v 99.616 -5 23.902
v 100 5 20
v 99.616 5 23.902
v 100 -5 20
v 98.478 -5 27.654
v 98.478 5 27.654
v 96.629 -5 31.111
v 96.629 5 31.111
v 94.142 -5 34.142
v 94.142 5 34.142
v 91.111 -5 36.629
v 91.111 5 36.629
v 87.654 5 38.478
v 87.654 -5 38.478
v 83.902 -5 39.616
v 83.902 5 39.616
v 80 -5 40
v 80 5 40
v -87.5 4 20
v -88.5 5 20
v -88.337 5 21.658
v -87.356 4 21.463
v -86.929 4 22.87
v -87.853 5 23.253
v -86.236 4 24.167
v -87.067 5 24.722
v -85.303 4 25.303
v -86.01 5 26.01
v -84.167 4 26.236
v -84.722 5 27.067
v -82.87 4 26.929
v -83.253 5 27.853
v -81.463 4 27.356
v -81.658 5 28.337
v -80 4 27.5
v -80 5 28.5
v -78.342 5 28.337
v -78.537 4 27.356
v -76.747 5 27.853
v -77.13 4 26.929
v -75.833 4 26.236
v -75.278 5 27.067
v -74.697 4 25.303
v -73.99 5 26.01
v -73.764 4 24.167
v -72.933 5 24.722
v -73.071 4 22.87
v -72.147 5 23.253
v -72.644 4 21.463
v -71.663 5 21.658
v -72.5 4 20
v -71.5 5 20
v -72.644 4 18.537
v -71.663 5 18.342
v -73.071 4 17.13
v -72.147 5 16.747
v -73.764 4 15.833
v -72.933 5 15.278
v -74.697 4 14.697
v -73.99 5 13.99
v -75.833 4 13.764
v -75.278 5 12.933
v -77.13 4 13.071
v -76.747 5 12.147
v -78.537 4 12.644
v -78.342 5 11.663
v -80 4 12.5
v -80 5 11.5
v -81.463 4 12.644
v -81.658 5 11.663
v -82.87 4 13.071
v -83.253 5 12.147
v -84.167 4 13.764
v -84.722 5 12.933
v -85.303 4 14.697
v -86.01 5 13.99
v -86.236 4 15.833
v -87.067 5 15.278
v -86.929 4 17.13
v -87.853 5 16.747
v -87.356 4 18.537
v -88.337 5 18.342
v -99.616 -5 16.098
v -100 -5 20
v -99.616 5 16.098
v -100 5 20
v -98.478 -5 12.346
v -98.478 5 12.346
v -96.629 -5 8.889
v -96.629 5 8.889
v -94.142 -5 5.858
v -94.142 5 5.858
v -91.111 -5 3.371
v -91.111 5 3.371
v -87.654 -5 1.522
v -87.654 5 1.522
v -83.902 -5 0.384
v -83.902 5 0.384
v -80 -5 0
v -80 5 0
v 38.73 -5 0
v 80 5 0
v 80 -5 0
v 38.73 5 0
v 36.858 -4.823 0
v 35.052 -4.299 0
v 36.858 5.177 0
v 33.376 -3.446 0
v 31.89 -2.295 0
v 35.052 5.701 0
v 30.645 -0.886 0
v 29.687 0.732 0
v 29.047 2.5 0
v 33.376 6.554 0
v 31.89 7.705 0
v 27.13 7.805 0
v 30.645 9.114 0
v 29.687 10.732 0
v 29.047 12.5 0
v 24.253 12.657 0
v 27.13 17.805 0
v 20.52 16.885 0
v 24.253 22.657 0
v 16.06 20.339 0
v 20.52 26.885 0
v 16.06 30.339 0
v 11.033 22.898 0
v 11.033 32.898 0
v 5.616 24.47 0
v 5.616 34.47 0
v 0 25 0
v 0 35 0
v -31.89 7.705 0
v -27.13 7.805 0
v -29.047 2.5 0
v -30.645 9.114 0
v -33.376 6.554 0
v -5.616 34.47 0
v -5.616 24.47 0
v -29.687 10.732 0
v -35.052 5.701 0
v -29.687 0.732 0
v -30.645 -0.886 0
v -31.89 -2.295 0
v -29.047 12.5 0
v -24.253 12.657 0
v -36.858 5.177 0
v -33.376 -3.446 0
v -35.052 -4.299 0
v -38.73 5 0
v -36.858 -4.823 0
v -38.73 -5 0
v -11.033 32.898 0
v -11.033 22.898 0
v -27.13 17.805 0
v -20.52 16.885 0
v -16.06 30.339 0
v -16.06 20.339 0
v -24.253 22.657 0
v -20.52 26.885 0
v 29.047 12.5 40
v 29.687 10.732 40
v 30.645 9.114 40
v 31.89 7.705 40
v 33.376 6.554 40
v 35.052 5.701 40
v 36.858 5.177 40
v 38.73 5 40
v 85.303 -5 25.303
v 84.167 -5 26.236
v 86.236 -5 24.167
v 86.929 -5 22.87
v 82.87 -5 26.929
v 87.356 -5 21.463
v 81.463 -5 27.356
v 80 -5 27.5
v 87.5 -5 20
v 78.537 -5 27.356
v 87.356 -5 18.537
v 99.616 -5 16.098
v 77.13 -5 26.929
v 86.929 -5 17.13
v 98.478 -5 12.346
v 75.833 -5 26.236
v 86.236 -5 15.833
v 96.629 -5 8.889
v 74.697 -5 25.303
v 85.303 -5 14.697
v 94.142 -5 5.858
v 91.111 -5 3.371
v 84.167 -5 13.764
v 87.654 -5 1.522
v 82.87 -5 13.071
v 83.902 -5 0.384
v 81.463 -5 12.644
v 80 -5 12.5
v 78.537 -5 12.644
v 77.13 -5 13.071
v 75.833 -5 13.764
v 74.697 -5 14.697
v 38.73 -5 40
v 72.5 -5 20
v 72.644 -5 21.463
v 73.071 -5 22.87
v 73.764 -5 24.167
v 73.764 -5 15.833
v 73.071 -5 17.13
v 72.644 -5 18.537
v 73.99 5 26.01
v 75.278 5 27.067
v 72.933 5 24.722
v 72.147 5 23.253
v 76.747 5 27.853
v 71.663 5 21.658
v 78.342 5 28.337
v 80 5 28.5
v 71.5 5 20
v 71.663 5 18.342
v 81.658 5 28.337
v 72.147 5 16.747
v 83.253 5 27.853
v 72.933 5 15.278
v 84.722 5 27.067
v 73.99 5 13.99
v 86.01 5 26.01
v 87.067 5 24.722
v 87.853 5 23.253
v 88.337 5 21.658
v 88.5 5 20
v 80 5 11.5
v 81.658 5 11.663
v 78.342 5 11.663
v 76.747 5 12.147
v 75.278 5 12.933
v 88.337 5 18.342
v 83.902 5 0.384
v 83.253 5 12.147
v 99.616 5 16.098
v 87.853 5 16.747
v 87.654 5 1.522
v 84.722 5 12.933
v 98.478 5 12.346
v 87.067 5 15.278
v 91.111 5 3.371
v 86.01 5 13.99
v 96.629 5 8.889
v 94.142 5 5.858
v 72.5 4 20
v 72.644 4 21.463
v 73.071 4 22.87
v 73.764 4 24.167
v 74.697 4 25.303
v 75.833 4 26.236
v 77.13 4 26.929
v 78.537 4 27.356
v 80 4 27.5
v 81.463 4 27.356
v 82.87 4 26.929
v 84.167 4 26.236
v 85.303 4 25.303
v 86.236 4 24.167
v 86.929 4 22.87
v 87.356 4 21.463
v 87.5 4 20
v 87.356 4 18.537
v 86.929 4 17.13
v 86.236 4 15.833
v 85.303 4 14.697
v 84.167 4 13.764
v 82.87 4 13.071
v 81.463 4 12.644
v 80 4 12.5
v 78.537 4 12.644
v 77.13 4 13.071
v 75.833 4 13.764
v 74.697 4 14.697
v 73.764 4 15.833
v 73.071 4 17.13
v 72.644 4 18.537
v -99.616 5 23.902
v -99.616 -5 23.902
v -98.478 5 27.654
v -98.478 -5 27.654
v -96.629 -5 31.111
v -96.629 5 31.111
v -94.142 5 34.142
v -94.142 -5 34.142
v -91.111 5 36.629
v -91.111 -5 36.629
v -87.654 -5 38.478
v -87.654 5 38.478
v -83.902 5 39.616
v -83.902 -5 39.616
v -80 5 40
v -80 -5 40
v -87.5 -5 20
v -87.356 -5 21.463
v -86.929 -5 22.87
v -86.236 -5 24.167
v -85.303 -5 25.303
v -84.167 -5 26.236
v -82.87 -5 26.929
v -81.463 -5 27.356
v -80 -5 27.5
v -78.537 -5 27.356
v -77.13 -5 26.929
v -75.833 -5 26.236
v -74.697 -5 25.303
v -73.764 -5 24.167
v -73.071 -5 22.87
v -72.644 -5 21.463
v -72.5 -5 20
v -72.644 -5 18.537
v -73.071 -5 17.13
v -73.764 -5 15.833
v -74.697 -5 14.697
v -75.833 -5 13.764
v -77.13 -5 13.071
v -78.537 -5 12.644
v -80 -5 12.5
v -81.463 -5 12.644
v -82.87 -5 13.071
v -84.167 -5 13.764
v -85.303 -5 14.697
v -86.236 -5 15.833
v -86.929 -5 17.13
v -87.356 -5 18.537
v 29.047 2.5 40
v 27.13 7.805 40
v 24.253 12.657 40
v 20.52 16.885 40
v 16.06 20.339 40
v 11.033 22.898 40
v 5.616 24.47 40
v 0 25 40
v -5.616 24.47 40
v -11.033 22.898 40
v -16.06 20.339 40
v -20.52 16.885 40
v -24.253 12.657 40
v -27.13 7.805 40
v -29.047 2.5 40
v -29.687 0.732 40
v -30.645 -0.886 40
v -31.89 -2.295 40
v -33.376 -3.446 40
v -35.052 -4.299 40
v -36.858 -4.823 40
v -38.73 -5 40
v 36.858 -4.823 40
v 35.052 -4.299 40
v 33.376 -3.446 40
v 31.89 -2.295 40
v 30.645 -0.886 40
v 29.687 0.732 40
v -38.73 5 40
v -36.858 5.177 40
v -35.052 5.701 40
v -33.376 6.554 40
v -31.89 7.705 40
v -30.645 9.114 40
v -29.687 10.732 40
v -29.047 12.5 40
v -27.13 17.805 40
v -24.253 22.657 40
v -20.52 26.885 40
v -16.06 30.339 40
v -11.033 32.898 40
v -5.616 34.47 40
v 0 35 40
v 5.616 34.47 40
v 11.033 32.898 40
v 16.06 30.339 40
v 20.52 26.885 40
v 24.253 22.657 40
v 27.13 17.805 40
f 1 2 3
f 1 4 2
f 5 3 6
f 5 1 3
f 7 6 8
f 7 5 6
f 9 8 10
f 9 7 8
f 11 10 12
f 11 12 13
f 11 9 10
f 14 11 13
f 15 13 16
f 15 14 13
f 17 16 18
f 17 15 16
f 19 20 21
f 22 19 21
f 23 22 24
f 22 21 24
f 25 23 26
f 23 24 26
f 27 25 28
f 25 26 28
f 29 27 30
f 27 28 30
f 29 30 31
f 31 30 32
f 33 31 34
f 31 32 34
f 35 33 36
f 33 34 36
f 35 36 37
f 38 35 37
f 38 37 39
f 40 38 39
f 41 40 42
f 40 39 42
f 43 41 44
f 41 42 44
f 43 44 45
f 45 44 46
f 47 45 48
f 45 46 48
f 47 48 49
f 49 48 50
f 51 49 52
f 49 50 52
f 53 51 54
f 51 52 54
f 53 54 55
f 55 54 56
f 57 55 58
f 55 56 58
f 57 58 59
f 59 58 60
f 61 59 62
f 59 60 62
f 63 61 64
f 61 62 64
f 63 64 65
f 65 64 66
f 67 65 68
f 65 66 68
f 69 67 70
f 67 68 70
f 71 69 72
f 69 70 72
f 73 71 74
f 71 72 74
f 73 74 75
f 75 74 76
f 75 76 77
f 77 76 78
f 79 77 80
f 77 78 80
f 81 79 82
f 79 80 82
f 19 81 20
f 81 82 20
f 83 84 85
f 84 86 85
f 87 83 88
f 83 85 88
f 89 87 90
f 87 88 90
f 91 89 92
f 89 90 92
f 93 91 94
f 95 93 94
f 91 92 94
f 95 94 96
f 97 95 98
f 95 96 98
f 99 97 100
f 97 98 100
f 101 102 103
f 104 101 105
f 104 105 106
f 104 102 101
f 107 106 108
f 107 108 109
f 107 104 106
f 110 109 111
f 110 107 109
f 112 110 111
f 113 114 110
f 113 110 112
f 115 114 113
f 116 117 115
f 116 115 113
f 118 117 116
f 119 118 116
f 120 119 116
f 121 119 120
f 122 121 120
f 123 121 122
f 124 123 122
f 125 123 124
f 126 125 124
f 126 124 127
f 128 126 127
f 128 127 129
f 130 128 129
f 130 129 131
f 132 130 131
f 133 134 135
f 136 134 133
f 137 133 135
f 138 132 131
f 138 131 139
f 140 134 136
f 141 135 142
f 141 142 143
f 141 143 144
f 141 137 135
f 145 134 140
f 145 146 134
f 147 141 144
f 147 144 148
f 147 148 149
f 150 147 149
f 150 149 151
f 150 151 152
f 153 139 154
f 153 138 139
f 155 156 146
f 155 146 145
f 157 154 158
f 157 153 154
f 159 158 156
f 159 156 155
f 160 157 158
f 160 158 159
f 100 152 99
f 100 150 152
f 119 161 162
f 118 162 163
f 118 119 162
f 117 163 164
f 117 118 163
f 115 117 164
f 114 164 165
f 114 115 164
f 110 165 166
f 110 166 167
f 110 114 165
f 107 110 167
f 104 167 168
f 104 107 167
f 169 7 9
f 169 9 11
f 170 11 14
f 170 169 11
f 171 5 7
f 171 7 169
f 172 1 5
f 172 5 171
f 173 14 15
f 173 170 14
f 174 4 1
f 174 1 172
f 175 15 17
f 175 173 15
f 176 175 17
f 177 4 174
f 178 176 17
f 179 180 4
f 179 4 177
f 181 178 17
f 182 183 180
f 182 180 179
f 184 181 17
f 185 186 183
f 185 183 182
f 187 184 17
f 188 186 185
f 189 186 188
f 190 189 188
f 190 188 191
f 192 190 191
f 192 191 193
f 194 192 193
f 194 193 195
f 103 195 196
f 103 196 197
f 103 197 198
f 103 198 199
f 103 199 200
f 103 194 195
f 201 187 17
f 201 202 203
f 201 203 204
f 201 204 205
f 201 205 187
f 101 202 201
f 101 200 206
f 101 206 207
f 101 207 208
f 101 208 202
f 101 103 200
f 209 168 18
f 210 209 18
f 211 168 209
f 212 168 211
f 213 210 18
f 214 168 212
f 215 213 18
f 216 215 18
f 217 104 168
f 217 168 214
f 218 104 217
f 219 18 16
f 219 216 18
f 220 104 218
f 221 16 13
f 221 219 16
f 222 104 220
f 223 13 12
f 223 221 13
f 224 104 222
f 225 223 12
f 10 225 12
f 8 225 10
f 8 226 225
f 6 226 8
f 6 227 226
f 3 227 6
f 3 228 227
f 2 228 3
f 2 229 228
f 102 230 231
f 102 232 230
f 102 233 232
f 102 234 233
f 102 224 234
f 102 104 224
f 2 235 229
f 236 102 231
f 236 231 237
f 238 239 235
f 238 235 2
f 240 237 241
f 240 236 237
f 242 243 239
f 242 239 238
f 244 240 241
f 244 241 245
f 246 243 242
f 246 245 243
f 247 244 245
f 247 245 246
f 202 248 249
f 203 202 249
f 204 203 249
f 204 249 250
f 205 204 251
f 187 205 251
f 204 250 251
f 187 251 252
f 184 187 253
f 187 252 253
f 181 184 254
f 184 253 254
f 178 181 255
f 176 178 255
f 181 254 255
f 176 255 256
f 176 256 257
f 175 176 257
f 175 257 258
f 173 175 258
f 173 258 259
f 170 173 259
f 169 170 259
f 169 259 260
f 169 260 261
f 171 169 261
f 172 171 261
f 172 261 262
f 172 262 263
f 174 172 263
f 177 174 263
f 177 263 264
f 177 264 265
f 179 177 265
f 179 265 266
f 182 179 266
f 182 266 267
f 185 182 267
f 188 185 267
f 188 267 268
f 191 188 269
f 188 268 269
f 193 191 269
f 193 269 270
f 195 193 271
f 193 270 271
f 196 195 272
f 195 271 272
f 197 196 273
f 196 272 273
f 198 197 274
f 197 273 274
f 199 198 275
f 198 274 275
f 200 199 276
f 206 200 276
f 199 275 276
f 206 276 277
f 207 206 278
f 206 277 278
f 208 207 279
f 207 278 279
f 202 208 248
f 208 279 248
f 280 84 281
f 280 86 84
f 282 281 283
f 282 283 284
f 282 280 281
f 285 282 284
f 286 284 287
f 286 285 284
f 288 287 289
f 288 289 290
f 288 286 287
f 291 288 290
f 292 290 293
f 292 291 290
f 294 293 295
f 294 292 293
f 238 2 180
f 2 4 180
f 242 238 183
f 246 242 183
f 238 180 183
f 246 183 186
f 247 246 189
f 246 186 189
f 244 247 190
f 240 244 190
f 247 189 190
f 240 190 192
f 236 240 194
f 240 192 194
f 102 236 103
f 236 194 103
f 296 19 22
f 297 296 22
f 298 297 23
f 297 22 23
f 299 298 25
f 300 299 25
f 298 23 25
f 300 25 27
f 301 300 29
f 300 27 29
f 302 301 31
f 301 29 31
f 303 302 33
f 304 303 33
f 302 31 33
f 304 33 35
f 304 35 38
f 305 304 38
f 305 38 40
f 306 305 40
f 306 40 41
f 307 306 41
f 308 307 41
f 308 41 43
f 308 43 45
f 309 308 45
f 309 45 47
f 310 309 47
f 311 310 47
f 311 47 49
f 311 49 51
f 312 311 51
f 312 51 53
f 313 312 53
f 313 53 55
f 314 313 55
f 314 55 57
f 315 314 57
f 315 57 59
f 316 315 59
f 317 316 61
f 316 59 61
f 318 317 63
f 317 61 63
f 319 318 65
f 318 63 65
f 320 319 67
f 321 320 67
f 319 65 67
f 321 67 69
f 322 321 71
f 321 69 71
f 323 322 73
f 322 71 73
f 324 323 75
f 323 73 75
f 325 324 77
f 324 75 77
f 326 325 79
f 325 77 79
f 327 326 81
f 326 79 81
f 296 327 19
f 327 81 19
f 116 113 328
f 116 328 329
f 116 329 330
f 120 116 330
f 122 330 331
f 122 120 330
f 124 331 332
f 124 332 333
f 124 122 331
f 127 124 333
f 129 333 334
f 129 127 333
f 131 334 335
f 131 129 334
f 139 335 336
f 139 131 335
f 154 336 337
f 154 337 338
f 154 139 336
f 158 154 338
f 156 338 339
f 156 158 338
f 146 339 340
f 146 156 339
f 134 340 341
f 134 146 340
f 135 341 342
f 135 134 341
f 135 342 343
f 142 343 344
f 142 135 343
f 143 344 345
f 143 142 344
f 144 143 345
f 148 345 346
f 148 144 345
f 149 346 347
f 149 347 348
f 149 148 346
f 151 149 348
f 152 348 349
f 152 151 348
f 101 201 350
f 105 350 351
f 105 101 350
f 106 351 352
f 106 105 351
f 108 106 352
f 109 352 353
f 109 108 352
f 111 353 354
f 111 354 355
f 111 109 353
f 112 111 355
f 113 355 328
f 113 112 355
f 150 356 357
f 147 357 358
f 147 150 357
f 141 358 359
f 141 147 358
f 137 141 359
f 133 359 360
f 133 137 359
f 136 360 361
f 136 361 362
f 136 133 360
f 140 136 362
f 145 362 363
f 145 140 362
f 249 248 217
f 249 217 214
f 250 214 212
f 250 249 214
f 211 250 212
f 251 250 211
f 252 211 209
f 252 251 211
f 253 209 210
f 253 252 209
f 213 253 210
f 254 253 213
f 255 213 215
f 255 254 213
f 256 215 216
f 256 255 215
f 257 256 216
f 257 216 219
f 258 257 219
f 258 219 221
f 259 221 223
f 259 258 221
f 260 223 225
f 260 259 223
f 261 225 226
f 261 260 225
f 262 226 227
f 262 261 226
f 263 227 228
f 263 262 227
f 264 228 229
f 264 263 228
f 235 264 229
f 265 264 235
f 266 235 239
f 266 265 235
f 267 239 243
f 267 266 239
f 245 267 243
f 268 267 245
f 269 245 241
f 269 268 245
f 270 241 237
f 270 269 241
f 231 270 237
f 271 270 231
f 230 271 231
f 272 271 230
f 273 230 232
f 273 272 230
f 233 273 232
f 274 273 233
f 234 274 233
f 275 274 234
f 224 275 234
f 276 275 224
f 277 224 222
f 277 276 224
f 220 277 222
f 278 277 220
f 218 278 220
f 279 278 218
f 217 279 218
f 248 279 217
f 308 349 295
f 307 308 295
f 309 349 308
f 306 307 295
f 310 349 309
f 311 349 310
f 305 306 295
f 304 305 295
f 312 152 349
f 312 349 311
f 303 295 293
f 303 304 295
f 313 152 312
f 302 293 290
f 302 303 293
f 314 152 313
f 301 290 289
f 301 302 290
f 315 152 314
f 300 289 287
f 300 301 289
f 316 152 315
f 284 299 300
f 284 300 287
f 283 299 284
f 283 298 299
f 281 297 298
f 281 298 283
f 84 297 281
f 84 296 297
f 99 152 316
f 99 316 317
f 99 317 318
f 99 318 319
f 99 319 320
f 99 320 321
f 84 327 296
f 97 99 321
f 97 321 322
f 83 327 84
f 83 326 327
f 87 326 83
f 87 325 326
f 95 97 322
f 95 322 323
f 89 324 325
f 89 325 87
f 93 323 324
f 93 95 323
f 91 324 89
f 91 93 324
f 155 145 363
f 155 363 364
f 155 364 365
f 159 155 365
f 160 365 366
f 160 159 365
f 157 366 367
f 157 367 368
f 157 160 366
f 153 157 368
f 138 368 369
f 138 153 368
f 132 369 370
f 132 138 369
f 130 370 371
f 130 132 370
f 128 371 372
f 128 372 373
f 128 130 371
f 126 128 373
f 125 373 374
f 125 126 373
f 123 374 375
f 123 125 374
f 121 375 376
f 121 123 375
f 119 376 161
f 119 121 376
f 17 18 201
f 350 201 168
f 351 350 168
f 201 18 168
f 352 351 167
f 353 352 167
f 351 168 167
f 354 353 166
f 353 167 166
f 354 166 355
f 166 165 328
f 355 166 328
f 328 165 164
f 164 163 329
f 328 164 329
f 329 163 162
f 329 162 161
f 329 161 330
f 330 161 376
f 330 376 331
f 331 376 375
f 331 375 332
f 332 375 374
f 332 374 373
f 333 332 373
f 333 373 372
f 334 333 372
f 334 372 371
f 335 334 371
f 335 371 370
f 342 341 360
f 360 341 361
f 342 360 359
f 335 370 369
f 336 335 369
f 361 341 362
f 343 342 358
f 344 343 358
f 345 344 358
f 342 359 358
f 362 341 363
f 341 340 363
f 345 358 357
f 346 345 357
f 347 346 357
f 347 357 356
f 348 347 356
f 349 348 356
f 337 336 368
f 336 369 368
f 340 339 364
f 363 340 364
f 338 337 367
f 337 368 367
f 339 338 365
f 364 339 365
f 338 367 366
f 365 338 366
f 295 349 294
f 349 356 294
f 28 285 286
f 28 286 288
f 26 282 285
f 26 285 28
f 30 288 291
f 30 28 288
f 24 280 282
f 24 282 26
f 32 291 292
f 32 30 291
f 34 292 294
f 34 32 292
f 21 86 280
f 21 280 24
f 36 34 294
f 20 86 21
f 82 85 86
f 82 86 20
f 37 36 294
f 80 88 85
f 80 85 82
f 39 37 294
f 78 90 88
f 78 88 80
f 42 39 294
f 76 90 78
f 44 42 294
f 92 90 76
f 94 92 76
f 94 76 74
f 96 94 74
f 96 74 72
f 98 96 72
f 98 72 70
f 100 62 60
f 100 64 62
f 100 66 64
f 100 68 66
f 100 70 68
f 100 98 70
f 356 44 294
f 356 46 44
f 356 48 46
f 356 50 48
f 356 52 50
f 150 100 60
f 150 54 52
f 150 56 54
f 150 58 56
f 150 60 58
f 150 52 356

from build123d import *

# Parameters (mm, degrees)
BOSS_EXTRUDE1_DEPTH = 40
FILLET1_R           = 20
SKETCH4_R           = 7.5
CUT_EXTRUDE1_DEPTH  = 40
CHAMFER1_SIZE       = 1


with BuildPart() as part:
    # Sketch3 → Boss-Extrude1 (new body)
    with BuildSketch(Plane.XY):
        with BuildLine():
            Line((-38.729833462, -5), (-100, -5))
            Line((-100, -5), (-100, 5))
            Line((-100, 5), (-38.729833462, 5))
            ThreePointArc((-38.729833462, 5), (-32.606109105, 7.09430585), (-29.047375097, 12.5))
            ThreePointArc((-29.047375097, 12.5), (0, 35), (29.047375097, 12.5))
            ThreePointArc((29.047375097, 12.5), (32.606109105, 7.09430585), (38.729833462, 5))
            Line((38.729833462, 5), (100, 5))
            Line((100, 5), (100, -5))
            Line((100, -5), (38.729833462, -5))
            ThreePointArc((38.729833462, -5), (32.606109105, -2.90569415), (29.047375097, 2.5))
            ThreePointArc((29.047375097, 2.5), (0, 25), (-29.047375097, 2.5))
            ThreePointArc((-29.047375097, 2.5), (-32.606109105, -2.90569415), (-38.729833462, -5))
        make_face()
    extrude(amount=BOSS_EXTRUDE1_DEPTH)

    # Fillet1
    fillet1_edges = [part.edges().sort_by_distance(p)[0] for p in [
        (100, 0, 0),
        (100, 0, 40),
        (-100, 0, 0),
        (-100, 0, 40),
    ]]
    fillet(fillet1_edges, radius=FILLET1_R - 0.0001)  # a hair under: the kernel refuses the full size

    # Sketch4 → Cut-Extrude1 (cut)
    with BuildSketch(Plane(origin=(0, 5, 0), x_dir=(1, 0, 0), z_dir=(0, 1, 0))):
        with Locations(Location((80, -20, 0), (0, 0, 180))):
            Circle(SKETCH4_R)
        with Locations(Location((-80, -20, 0), (0, 0, 180))):
            Circle(SKETCH4_R)
    extrude(amount=-CUT_EXTRUDE1_DEPTH, mode=Mode.SUBTRACT)

    # Chamfer1
    chamfer1_edges = [part.edges().sort_by_distance(p)[0] for p in [
        (87.5, 5, 20),
        (-72.5, 5, 20),
    ]]
    chamfer(chamfer1_edges, length=CHAMFER1_SIZE)


solid = part.part
